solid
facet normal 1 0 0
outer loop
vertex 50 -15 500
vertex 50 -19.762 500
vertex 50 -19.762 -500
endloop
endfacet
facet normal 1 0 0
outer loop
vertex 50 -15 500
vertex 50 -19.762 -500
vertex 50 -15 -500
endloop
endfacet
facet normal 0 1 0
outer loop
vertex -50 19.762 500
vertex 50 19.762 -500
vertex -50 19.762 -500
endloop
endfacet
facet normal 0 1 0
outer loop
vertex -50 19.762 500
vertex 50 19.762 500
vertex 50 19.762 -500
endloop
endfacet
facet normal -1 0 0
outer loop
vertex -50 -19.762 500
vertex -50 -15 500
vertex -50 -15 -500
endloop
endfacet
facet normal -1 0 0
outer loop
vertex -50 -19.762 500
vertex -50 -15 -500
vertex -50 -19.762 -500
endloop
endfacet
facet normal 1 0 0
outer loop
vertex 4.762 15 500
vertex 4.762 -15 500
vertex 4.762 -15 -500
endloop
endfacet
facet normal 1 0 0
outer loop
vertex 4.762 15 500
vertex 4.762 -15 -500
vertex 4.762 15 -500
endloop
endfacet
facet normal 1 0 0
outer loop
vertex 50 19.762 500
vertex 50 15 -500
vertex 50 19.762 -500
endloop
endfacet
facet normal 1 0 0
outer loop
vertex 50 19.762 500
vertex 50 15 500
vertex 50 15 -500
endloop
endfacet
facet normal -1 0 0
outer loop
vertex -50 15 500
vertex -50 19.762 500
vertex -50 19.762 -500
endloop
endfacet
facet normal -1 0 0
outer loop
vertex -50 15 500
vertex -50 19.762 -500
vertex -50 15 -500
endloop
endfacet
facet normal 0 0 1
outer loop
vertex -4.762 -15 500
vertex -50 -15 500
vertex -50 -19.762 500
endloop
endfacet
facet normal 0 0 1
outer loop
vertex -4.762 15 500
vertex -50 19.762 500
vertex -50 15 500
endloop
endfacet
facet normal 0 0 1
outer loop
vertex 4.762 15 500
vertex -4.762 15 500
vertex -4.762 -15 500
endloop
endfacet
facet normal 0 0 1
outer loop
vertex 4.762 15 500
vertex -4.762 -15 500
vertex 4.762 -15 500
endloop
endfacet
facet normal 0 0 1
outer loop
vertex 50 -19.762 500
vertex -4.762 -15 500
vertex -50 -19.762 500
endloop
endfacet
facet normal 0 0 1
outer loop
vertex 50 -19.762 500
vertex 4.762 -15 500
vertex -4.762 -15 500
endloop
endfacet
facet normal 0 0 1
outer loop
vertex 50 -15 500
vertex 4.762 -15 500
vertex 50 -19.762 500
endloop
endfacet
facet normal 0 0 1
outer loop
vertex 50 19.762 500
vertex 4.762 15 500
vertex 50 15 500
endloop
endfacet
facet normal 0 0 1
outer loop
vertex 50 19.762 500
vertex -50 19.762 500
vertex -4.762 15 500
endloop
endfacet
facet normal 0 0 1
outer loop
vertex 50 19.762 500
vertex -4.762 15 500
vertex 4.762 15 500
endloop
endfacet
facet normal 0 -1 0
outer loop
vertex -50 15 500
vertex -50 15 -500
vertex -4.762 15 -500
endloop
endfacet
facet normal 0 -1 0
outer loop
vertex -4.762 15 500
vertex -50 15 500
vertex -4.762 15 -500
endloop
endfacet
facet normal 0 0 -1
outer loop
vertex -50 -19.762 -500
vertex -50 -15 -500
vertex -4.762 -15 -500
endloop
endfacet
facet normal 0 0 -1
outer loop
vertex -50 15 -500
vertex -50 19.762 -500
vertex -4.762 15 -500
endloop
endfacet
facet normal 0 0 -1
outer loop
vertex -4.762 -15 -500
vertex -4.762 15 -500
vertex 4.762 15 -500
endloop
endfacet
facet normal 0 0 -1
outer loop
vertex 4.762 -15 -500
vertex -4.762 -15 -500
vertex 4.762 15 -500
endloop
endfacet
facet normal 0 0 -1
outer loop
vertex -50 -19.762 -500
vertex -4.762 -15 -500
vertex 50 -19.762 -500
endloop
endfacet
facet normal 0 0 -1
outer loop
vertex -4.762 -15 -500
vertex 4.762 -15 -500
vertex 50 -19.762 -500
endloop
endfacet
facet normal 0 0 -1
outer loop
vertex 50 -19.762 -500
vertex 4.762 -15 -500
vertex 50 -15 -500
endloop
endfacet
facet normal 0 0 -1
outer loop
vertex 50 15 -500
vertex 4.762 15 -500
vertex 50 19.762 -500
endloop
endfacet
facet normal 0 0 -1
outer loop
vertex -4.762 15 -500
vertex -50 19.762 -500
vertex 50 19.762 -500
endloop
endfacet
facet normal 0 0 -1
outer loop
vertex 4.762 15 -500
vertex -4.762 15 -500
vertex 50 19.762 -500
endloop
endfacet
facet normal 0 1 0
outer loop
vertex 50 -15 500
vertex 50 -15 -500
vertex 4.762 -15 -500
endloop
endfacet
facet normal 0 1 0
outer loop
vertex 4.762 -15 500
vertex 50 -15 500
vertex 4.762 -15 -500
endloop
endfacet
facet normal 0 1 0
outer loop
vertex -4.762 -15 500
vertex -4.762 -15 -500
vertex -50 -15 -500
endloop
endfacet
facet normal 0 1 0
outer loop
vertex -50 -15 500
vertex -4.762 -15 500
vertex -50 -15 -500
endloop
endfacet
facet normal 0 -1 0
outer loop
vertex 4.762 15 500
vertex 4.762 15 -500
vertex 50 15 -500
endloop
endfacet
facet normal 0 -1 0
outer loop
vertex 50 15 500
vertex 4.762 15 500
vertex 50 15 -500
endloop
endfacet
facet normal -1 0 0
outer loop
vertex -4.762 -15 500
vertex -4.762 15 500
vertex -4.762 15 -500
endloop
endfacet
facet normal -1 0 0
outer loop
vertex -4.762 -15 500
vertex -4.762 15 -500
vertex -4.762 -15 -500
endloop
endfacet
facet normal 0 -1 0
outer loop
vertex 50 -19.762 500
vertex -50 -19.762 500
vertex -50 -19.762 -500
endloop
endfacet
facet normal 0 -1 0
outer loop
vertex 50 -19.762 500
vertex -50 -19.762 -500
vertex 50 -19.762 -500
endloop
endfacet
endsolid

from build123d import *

# Parameters (mm, degrees)
SALIENTE_EXTRUIR1_DEPTH = 500


with BuildPart() as part:
    # Croquis1 → Saliente-Extruir1 (new, symmetric)
    with BuildSketch(Plane.XY):
        Polygon((50, 19.7625), (0, 19.7625), (0, 0), (4.7625, 0), (4.7625, 15), (50, 15), align=None)
        Polygon((4.7625, 0), (0, 0), (0, -19.7625), (50, -19.7625), (50, -15), (4.7625, -15), align=None)
        Polygon((0, 0), (0, 19.7625), (-50, 19.7625), (-50, 15), (-4.7625, 15), (-4.7625, 0), align=None)
        Polygon((0, -19.7625), (0, 0), (-4.7625, 0), (-4.7625, -15), (-50, -15), (-50, -19.7625), align=None)
    extrude(amount=SALIENTE_EXTRUIR1_DEPTH, both=True)


solid = part.part
